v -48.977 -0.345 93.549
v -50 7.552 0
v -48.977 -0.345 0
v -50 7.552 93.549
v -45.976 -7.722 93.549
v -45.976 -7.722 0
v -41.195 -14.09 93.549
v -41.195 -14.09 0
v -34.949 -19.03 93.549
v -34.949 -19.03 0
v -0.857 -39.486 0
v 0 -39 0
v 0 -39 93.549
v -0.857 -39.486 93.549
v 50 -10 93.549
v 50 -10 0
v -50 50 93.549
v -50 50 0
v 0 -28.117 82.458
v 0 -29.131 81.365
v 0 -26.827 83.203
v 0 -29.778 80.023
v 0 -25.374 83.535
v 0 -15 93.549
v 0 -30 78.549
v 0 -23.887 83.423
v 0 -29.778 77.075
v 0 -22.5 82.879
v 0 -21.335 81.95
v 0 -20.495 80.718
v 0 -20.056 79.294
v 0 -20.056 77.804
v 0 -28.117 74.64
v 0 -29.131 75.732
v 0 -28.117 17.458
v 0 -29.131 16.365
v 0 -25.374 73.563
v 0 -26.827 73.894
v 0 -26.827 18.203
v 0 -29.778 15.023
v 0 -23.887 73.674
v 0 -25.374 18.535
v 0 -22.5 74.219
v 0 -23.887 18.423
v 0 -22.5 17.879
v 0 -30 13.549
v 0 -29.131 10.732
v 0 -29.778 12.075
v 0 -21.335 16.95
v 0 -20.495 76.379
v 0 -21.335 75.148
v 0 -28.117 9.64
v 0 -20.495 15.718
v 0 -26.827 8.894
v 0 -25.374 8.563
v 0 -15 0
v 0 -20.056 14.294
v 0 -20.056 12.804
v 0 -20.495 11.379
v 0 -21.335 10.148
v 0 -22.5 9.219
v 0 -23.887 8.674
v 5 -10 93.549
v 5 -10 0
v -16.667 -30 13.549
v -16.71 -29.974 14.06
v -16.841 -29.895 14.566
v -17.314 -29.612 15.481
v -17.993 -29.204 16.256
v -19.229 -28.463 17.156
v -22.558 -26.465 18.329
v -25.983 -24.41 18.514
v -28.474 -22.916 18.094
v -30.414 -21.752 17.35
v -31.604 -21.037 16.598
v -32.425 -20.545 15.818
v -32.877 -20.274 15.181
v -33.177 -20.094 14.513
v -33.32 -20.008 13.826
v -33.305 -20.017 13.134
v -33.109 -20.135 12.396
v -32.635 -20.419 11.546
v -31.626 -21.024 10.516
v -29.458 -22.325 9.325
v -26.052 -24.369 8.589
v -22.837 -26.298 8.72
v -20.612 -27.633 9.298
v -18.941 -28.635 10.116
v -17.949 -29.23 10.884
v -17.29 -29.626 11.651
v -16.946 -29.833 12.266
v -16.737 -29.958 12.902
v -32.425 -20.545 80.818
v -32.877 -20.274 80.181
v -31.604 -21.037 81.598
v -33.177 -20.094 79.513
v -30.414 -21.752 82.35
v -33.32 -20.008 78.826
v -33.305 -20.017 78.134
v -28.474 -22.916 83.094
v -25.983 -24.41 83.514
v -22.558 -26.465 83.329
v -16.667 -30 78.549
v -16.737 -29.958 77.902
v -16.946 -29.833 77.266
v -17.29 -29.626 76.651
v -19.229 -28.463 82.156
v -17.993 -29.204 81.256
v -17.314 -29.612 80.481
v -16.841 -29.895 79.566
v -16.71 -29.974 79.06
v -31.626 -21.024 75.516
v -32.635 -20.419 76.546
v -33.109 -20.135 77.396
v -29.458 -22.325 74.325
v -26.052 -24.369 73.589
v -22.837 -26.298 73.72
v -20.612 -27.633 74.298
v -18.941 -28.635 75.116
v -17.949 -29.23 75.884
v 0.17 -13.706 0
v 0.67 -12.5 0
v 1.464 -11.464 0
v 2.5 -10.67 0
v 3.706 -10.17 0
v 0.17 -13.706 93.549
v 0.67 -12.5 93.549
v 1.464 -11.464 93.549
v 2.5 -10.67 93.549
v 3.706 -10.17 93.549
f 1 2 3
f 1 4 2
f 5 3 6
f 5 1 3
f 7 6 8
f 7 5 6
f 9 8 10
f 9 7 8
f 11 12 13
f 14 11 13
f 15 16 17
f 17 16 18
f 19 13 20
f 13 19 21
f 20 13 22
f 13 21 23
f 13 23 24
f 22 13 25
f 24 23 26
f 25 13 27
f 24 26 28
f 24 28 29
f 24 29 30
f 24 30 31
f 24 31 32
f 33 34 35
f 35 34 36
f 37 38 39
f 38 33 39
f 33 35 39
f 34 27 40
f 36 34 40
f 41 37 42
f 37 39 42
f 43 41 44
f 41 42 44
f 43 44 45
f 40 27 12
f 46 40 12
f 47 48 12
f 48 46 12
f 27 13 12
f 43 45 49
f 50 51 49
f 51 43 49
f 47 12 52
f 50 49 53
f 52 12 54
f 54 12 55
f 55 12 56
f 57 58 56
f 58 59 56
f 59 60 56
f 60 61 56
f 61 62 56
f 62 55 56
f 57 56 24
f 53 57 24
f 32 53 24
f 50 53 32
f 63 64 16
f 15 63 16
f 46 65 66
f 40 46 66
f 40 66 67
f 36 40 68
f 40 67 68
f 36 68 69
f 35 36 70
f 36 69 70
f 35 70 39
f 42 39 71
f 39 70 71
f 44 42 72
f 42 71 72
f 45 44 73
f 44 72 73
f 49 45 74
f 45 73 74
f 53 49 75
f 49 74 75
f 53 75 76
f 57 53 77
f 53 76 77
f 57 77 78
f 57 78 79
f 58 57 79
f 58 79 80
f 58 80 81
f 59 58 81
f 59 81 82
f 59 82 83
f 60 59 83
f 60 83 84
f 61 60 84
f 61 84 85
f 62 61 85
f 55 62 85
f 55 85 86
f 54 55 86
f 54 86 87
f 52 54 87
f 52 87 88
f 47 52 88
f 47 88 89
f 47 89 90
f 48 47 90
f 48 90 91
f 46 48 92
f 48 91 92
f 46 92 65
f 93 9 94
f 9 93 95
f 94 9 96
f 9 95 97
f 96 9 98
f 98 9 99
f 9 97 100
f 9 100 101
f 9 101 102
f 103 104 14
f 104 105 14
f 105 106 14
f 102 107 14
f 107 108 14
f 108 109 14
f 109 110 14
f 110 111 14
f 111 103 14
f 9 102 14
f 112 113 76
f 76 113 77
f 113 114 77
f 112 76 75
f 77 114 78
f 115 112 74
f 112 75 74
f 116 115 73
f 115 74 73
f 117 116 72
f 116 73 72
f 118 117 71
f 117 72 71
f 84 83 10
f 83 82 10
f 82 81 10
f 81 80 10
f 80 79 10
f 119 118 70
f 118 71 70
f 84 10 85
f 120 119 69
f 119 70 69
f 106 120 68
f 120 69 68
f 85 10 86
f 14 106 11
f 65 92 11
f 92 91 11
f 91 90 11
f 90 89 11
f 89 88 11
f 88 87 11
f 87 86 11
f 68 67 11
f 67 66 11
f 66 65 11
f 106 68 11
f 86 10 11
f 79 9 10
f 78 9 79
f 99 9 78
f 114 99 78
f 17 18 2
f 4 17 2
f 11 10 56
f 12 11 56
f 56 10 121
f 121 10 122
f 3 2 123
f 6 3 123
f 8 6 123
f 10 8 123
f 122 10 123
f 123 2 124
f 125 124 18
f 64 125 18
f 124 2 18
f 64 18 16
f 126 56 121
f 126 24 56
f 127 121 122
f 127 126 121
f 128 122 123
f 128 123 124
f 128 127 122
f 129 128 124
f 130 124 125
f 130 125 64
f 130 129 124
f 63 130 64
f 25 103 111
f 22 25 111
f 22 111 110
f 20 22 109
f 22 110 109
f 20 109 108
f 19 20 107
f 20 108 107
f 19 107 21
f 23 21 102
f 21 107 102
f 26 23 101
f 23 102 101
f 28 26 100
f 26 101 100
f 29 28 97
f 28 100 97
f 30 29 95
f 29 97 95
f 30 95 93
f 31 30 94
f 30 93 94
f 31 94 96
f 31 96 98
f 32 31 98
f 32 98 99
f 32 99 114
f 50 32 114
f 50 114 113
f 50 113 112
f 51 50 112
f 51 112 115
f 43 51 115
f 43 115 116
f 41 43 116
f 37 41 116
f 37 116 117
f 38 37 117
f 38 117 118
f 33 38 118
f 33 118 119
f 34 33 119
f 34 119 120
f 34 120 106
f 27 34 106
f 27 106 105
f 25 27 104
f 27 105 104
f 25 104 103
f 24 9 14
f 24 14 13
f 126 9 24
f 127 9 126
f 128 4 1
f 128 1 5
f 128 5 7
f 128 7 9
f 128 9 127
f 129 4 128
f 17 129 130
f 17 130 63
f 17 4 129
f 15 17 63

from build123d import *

# Parameters (mm, degrees)
F1_DEPTH = 93.548797
F3_D     = 10
F4_R     = 31
F5_SIZE  = 1
F6_R     = 5


with BuildPart() as f1:
    # F0 (on Top) → F1 (new body)
    with BuildSketch(Plane.XY):
        Polygon((50, -10), (-50, 50), (-50, -10), (0, -40), (0, -10), align=None)
    extrude(amount=F1_DEPTH)

    # F3 (through all)
    with Locations(Plane.YZ):
        with Locations((-25, 78.548797), (-25, 13.548797)):
            Hole(F3_D / 2)

    # F4
    f4_edges = [f1.edges().sort_by_distance(p)[0] for p in [
        (-50, -10, 46.774399),
    ]]
    fillet(f4_edges, radius=F4_R)

    # F5
    f5_edges = [f1.edges().sort_by_distance(p)[0] for p in [
        (0, -40, 46.774399),
    ]]
    chamfer(f5_edges, length=F5_SIZE)

    # F6
    f6_edges = [f1.edges().sort_by_distance(p)[0] for p in [
        (0, -10, 46.774399),
    ]]
    fillet(f6_edges, radius=F6_R)


solid = f1.part
